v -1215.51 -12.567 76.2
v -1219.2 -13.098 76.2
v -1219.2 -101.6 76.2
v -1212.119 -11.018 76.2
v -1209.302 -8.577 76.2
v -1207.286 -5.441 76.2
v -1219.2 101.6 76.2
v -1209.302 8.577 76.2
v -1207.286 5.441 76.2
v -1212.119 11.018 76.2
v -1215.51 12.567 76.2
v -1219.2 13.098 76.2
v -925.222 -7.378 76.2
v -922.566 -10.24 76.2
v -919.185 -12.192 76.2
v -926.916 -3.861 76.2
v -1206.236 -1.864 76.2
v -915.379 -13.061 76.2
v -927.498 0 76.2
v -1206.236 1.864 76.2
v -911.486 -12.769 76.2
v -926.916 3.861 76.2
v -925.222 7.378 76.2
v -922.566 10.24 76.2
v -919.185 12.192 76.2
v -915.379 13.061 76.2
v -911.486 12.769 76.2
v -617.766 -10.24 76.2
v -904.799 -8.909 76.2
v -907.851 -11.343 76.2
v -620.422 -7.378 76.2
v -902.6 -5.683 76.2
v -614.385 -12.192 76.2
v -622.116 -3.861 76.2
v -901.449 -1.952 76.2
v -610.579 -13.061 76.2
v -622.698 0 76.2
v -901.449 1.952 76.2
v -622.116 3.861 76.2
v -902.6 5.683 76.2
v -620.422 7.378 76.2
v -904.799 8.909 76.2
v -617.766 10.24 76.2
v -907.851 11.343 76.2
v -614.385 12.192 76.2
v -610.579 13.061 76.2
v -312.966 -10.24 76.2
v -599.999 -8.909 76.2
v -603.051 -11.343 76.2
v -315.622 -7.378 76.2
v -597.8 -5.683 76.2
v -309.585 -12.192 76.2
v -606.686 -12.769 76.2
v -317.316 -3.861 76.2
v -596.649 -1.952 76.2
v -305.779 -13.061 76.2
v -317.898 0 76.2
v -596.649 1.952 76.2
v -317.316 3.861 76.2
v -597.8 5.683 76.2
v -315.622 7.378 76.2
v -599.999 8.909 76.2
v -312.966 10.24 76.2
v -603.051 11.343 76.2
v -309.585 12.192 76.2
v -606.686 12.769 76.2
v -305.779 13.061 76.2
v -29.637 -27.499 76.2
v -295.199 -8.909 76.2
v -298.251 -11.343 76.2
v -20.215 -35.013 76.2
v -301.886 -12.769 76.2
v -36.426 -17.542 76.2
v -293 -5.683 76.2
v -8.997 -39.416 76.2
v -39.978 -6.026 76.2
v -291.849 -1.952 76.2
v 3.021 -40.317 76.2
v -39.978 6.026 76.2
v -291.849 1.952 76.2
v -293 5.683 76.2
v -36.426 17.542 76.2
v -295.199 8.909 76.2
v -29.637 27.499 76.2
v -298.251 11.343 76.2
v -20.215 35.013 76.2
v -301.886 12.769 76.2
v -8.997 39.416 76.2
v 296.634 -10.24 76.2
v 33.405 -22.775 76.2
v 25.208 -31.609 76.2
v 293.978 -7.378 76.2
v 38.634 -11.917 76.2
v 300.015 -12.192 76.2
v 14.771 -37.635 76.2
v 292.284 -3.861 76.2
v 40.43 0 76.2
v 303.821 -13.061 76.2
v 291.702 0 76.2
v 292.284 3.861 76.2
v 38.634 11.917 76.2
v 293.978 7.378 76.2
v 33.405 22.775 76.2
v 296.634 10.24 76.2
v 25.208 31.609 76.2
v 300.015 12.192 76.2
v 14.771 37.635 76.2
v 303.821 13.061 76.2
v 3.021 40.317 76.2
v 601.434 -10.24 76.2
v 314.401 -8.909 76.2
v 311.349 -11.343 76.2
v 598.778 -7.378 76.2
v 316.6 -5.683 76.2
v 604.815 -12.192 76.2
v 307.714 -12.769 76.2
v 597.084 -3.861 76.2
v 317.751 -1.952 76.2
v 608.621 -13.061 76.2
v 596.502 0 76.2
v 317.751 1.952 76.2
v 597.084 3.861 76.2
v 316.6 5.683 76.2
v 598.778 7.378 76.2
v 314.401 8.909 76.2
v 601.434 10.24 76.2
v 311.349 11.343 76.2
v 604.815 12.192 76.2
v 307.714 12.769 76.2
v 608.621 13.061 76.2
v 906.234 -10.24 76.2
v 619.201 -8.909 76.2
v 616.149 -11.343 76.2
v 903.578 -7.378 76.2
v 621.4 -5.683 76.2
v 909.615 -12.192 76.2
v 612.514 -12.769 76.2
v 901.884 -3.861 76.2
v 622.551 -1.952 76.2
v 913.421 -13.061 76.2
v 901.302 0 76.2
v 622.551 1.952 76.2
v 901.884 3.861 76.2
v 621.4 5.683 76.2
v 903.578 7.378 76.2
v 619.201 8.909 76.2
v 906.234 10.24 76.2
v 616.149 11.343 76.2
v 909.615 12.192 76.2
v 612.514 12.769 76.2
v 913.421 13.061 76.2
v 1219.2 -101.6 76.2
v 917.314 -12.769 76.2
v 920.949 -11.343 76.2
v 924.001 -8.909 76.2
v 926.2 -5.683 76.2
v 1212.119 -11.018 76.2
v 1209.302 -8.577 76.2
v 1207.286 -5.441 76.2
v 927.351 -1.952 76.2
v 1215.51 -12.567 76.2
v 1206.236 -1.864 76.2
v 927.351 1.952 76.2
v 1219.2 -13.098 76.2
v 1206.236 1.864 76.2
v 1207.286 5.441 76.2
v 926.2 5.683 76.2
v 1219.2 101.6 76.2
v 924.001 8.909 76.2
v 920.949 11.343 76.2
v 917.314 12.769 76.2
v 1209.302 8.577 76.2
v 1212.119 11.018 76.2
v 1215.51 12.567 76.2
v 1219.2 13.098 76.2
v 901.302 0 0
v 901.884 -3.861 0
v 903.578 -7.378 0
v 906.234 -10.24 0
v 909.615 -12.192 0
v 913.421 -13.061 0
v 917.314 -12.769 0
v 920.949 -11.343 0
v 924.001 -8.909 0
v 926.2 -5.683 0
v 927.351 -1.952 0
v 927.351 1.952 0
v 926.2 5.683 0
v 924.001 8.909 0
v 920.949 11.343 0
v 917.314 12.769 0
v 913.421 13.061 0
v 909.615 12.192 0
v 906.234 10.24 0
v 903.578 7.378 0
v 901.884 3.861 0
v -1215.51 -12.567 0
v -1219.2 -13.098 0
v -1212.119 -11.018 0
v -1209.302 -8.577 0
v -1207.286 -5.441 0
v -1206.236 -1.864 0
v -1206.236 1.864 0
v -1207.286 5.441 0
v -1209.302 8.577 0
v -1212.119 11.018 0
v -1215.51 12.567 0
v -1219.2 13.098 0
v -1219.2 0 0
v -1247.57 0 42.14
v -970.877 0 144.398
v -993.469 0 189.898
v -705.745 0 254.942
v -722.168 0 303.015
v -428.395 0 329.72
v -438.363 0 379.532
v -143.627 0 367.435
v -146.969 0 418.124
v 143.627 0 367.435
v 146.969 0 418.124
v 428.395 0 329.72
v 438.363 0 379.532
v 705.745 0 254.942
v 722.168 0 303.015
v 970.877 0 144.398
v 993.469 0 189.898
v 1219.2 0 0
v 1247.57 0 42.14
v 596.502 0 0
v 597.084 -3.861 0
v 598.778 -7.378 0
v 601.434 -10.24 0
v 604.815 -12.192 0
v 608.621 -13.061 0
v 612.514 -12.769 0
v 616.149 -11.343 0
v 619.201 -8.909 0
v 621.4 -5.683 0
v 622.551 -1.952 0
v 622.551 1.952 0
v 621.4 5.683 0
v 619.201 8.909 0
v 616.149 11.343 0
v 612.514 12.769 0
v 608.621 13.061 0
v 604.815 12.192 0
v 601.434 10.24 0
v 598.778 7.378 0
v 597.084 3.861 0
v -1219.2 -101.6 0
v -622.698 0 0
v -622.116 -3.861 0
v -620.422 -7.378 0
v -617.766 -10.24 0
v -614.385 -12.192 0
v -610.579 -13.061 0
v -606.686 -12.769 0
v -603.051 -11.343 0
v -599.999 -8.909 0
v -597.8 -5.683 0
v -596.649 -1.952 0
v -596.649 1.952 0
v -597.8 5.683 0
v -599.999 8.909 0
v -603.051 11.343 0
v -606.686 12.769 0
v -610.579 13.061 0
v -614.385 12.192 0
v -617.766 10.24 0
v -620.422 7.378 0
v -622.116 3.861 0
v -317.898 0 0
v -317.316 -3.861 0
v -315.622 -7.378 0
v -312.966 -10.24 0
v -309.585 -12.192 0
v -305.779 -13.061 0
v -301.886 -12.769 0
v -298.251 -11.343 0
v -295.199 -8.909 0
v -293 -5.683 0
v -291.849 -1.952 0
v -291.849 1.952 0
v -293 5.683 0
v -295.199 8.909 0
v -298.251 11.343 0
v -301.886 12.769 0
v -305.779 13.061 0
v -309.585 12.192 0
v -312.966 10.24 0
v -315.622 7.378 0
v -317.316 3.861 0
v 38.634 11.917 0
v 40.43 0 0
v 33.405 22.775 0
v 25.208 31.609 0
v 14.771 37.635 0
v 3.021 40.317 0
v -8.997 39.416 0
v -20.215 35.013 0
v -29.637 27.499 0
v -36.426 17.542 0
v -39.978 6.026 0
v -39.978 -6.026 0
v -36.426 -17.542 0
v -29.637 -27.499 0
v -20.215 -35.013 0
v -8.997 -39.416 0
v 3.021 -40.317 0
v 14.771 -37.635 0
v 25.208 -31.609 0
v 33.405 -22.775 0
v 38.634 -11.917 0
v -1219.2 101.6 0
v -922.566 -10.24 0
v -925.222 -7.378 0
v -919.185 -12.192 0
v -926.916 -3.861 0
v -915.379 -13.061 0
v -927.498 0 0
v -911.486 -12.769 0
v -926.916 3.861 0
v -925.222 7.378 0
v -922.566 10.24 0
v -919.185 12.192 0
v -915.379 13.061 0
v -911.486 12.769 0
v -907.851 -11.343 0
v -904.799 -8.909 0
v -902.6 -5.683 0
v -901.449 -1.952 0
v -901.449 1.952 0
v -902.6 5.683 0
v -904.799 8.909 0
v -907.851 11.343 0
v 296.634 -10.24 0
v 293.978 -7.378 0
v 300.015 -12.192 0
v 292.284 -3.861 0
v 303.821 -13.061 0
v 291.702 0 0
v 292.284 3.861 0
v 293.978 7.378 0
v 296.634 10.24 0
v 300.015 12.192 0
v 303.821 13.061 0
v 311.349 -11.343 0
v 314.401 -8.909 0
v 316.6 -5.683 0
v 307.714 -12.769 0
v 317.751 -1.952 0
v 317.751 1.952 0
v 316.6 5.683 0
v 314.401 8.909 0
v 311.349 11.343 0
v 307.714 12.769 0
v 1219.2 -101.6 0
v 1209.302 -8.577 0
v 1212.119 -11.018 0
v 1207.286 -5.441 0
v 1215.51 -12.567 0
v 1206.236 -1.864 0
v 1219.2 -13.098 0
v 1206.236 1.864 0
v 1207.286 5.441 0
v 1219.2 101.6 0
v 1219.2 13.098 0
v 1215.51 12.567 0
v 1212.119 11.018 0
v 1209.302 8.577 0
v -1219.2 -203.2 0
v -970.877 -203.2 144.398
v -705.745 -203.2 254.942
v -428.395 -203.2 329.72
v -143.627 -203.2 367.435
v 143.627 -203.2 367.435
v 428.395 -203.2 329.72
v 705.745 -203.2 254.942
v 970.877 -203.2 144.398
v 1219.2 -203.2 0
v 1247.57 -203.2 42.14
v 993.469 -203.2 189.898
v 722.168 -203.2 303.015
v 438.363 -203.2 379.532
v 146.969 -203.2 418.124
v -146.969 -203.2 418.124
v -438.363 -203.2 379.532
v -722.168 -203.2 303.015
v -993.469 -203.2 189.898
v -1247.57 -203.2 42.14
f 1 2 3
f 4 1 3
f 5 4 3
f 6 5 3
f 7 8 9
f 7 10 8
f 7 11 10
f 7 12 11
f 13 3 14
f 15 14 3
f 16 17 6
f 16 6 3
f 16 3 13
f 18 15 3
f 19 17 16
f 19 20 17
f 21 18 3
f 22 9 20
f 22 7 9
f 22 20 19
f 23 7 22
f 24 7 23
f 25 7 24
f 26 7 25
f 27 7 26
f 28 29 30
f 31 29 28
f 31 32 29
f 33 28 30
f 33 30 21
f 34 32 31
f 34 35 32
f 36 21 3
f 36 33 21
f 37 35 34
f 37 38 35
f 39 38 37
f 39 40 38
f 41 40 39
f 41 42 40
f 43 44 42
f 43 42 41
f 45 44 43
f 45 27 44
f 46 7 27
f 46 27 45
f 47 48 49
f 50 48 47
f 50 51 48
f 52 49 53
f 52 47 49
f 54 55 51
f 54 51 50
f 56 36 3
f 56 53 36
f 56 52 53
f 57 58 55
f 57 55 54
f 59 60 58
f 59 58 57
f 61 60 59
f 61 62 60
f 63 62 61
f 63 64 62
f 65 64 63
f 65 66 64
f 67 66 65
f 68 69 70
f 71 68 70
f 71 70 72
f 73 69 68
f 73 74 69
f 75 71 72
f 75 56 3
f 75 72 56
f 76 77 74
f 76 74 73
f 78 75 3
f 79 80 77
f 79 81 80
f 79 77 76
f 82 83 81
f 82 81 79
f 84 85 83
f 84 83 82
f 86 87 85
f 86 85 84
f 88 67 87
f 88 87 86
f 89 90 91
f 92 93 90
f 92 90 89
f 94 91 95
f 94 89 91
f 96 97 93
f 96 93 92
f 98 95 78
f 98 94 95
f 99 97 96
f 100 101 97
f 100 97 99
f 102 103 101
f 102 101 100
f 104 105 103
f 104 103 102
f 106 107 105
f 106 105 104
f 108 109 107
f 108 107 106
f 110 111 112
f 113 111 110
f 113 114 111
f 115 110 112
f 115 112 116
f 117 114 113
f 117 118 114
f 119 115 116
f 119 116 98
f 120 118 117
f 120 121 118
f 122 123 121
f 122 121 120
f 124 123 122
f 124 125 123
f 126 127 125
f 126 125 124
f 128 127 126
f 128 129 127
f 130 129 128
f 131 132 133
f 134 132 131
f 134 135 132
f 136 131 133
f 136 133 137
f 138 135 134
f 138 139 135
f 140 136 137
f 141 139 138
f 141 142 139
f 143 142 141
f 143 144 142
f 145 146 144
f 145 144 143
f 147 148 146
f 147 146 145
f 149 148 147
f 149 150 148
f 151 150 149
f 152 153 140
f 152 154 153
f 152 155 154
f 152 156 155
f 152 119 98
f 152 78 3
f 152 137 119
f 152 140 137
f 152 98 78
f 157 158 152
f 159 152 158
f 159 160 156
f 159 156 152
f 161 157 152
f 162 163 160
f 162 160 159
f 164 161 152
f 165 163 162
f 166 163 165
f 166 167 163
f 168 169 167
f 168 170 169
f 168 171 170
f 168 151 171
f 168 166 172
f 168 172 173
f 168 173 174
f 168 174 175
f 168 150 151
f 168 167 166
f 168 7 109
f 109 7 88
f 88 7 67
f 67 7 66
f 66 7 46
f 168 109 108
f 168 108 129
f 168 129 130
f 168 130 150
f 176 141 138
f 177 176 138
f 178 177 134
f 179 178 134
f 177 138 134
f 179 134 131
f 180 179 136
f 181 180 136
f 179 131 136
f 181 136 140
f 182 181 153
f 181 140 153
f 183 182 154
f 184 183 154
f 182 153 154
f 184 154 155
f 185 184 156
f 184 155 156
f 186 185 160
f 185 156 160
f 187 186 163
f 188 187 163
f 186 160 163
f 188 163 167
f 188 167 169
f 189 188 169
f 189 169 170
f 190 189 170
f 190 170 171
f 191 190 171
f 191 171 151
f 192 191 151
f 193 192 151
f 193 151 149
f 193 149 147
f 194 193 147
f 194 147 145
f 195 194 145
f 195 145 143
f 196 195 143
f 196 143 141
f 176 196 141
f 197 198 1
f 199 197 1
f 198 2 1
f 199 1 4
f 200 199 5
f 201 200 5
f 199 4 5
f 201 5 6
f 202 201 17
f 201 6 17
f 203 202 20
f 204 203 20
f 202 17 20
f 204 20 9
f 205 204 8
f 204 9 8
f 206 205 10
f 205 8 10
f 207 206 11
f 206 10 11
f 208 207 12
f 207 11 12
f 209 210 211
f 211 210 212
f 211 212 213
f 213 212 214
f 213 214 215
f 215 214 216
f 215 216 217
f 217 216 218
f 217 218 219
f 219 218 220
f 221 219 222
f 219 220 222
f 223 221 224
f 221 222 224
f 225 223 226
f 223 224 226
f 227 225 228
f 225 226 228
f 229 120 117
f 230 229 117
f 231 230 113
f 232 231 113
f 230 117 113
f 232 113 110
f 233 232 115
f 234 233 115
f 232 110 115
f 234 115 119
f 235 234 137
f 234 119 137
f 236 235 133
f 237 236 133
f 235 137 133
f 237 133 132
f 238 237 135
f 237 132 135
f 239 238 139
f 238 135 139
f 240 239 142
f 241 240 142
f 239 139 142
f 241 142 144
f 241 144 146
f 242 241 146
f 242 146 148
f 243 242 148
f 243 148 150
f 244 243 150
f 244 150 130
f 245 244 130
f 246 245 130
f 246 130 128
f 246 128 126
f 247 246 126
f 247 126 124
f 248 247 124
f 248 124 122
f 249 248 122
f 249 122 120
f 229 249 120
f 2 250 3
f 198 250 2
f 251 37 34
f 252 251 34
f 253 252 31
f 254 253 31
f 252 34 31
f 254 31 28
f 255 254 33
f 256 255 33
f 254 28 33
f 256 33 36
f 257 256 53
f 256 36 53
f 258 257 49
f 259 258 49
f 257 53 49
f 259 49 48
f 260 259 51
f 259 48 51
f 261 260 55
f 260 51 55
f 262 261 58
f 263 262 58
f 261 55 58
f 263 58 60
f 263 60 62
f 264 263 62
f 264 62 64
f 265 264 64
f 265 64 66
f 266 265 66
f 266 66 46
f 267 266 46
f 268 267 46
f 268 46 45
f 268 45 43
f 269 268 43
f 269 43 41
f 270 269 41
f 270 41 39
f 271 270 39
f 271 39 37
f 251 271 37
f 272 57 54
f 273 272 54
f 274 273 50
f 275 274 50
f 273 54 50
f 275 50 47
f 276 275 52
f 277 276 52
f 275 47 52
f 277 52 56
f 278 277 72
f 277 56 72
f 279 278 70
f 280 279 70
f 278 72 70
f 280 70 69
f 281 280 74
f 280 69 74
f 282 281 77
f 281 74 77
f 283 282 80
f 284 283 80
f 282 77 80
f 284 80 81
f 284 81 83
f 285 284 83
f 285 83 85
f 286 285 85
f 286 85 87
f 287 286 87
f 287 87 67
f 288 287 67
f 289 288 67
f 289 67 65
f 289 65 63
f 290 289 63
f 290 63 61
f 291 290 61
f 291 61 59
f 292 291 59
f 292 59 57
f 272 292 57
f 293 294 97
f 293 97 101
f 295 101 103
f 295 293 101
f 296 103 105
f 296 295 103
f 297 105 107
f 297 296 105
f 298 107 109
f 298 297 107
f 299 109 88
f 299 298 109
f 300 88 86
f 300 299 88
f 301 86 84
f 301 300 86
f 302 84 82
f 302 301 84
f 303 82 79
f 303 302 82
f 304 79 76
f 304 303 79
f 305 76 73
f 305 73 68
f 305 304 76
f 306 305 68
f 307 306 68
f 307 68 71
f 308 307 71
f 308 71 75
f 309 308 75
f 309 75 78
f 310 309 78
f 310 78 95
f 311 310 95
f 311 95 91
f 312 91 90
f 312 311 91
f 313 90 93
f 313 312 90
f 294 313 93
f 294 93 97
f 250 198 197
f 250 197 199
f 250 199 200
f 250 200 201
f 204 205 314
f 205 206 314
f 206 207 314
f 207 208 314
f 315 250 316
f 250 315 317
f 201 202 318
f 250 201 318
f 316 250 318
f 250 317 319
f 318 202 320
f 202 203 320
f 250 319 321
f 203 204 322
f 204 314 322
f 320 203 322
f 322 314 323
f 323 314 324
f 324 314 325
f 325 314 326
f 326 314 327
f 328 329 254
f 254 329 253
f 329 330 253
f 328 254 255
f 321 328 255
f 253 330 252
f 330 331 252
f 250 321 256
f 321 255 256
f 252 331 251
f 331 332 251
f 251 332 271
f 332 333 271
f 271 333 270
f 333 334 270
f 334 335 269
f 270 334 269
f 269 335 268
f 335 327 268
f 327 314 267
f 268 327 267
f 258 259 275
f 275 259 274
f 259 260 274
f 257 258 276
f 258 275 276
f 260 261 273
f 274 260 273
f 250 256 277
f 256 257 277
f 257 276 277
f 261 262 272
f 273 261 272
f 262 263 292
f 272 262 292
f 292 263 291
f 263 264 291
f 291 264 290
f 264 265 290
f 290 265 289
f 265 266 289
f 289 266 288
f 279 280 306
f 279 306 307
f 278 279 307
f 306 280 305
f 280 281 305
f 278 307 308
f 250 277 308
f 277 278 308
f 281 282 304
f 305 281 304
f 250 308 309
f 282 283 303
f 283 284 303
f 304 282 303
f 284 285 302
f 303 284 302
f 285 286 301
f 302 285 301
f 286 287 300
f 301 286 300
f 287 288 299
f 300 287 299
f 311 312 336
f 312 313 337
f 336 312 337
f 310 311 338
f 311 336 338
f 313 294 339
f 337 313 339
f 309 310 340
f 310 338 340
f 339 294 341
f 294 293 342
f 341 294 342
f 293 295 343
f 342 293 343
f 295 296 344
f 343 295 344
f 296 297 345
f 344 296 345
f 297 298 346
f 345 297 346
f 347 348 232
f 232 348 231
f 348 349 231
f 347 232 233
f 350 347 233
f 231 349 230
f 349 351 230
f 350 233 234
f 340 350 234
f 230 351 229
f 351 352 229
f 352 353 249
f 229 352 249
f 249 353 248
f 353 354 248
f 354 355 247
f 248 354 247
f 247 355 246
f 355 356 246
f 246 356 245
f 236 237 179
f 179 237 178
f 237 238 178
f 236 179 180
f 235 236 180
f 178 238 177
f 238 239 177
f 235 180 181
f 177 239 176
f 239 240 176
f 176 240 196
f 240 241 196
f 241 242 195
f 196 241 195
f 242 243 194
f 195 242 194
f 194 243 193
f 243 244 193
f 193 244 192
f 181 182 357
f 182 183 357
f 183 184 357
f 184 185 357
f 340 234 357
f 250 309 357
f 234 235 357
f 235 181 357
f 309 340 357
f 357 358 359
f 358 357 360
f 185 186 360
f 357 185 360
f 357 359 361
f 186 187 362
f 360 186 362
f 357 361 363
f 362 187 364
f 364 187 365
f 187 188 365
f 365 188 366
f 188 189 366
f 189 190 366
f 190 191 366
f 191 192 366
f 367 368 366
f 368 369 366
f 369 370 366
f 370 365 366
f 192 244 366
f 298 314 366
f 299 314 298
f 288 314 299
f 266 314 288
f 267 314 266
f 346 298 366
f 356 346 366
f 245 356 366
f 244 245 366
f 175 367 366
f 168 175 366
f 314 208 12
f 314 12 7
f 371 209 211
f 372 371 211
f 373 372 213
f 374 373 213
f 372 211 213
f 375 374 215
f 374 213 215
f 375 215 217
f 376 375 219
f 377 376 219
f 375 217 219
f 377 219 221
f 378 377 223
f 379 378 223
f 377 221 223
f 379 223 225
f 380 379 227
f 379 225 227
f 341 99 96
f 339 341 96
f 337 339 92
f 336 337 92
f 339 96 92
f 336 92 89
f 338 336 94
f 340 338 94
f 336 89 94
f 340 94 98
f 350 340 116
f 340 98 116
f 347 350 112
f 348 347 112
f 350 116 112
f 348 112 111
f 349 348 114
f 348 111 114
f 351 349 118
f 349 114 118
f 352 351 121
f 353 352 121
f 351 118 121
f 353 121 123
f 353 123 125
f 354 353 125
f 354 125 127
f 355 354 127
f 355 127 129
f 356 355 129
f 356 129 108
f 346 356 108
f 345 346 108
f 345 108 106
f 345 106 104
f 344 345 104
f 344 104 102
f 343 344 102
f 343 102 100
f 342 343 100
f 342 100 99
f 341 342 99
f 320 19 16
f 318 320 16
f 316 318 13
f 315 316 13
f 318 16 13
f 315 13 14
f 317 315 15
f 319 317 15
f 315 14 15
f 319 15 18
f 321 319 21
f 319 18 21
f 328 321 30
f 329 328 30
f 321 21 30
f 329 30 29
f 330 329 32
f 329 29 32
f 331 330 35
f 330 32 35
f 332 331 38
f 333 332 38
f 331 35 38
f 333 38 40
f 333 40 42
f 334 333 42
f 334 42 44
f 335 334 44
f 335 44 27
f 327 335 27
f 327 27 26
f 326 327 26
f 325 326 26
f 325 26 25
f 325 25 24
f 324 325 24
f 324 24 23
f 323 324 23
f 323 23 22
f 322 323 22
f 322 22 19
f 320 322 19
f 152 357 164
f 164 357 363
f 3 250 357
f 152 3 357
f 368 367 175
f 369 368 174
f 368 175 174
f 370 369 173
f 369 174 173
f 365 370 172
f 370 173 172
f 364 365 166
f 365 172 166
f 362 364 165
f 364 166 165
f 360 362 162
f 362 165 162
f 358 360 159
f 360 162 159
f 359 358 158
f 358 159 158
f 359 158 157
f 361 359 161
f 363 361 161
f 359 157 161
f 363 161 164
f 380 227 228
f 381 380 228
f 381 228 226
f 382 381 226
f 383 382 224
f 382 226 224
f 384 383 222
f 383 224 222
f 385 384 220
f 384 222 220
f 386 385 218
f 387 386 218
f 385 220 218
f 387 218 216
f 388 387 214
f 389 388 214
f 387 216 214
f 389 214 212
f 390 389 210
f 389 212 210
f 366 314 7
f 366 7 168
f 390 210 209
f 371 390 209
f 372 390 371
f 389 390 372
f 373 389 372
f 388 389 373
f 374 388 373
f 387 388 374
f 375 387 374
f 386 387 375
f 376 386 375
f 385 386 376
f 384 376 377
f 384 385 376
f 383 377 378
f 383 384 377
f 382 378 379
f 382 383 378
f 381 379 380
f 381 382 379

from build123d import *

# Parameters (mm, degrees)
F1_DEPTH = 203.2
F5_W     = 2438.4
F5_H     = 203.2
F5_R     = 40.4299269337
F6_DEPTH = 76.2
F7_D     = 26.19502
F8_D     = 26.19502
F9_D     = 26.19502
F10_D    = 26.19502
F11_D    = 26.19502
F12_D    = 26.19502
F13_D    = 26.19502
F14_D    = 26.19502


with BuildPart() as f1:
    # F0 (on Front) → F1 (new body)
    with BuildSketch(Plane.XZ):
        with BuildLine():
            ThreePointArc((-1219.2, 0), (0, 372.164270083), (1219.2, 0))
            Line((1219.2, 0), (1247.5701760273, 42.1399230206))
            ThreePointArc((1247.5701760273, 42.1399230206), (0, 422.964270083), (-1247.5701760273, 42.1399230206))
            Line((-1247.5701760273, 42.1399230206), (-1219.2, 0))
        make_face()
    extrude(amount=F1_DEPTH)


with BuildPart() as f6:
    # F5 (on Top) → F6 (new body)
    with BuildSketch(Plane.XY):
        Rectangle(F5_W, F5_H)
        Circle(F5_R, mode=Mode.SUBTRACT)
    extrude(amount=F6_DEPTH)

    # F7 (through all)
    with Locations(Plane(origin=(0, 0, 0), x_dir=(1, 0, 0), z_dir=(0, 0, -1))):
        with Locations((-914.4, 0)):
            Hole(F7_D / 2)

    # F8 (through all)
    with Locations(Plane(origin=(0, 0, 0), x_dir=(1, 0, 0), z_dir=(0, 0, -1))):
        with Locations((-609.6, 0)):
            Hole(F8_D / 2)

    # F9 (through all)
    with Locations(Plane(origin=(0, 0, 0), x_dir=(1, 0, 0), z_dir=(0, 0, -1))):
        with Locations((-304.8, 0)):
            Hole(F9_D / 2)

    # F10 (through all)
    with Locations(Plane(origin=(0, 0, 0), x_dir=(1, 0, 0), z_dir=(0, 0, -1))):
        with Locations((304.8, 0)):
            Hole(F10_D / 2)

    # F11 (through all)
    with Locations(Plane(origin=(0, 0, 0), x_dir=(1, 0, 0), z_dir=(0, 0, -1))):
        with Locations((609.6, 0)):
            Hole(F11_D / 2)

    # F12 (through all)
    with Locations(Plane(origin=(0, 0, 0), x_dir=(1, 0, 0), z_dir=(0, 0, -1))):
        with Locations((914.4, 0)):
            Hole(F12_D / 2)

    # F13 (through all)
    with Locations(Plane(origin=(0, 0, 0), x_dir=(1, 0, 0), z_dir=(0, 0, -1))):
        with Locations((1219.2, 0)):
            Hole(F13_D / 2)

    # F14 (through all)
    with Locations(Plane(origin=(0, 0, 0), x_dir=(1, 0, 0), z_dir=(0, 0, -1))):
        with Locations((-1219.2, 0)):
            Hole(F14_D / 2)


solid = Compound([f1.part, f6.part])
